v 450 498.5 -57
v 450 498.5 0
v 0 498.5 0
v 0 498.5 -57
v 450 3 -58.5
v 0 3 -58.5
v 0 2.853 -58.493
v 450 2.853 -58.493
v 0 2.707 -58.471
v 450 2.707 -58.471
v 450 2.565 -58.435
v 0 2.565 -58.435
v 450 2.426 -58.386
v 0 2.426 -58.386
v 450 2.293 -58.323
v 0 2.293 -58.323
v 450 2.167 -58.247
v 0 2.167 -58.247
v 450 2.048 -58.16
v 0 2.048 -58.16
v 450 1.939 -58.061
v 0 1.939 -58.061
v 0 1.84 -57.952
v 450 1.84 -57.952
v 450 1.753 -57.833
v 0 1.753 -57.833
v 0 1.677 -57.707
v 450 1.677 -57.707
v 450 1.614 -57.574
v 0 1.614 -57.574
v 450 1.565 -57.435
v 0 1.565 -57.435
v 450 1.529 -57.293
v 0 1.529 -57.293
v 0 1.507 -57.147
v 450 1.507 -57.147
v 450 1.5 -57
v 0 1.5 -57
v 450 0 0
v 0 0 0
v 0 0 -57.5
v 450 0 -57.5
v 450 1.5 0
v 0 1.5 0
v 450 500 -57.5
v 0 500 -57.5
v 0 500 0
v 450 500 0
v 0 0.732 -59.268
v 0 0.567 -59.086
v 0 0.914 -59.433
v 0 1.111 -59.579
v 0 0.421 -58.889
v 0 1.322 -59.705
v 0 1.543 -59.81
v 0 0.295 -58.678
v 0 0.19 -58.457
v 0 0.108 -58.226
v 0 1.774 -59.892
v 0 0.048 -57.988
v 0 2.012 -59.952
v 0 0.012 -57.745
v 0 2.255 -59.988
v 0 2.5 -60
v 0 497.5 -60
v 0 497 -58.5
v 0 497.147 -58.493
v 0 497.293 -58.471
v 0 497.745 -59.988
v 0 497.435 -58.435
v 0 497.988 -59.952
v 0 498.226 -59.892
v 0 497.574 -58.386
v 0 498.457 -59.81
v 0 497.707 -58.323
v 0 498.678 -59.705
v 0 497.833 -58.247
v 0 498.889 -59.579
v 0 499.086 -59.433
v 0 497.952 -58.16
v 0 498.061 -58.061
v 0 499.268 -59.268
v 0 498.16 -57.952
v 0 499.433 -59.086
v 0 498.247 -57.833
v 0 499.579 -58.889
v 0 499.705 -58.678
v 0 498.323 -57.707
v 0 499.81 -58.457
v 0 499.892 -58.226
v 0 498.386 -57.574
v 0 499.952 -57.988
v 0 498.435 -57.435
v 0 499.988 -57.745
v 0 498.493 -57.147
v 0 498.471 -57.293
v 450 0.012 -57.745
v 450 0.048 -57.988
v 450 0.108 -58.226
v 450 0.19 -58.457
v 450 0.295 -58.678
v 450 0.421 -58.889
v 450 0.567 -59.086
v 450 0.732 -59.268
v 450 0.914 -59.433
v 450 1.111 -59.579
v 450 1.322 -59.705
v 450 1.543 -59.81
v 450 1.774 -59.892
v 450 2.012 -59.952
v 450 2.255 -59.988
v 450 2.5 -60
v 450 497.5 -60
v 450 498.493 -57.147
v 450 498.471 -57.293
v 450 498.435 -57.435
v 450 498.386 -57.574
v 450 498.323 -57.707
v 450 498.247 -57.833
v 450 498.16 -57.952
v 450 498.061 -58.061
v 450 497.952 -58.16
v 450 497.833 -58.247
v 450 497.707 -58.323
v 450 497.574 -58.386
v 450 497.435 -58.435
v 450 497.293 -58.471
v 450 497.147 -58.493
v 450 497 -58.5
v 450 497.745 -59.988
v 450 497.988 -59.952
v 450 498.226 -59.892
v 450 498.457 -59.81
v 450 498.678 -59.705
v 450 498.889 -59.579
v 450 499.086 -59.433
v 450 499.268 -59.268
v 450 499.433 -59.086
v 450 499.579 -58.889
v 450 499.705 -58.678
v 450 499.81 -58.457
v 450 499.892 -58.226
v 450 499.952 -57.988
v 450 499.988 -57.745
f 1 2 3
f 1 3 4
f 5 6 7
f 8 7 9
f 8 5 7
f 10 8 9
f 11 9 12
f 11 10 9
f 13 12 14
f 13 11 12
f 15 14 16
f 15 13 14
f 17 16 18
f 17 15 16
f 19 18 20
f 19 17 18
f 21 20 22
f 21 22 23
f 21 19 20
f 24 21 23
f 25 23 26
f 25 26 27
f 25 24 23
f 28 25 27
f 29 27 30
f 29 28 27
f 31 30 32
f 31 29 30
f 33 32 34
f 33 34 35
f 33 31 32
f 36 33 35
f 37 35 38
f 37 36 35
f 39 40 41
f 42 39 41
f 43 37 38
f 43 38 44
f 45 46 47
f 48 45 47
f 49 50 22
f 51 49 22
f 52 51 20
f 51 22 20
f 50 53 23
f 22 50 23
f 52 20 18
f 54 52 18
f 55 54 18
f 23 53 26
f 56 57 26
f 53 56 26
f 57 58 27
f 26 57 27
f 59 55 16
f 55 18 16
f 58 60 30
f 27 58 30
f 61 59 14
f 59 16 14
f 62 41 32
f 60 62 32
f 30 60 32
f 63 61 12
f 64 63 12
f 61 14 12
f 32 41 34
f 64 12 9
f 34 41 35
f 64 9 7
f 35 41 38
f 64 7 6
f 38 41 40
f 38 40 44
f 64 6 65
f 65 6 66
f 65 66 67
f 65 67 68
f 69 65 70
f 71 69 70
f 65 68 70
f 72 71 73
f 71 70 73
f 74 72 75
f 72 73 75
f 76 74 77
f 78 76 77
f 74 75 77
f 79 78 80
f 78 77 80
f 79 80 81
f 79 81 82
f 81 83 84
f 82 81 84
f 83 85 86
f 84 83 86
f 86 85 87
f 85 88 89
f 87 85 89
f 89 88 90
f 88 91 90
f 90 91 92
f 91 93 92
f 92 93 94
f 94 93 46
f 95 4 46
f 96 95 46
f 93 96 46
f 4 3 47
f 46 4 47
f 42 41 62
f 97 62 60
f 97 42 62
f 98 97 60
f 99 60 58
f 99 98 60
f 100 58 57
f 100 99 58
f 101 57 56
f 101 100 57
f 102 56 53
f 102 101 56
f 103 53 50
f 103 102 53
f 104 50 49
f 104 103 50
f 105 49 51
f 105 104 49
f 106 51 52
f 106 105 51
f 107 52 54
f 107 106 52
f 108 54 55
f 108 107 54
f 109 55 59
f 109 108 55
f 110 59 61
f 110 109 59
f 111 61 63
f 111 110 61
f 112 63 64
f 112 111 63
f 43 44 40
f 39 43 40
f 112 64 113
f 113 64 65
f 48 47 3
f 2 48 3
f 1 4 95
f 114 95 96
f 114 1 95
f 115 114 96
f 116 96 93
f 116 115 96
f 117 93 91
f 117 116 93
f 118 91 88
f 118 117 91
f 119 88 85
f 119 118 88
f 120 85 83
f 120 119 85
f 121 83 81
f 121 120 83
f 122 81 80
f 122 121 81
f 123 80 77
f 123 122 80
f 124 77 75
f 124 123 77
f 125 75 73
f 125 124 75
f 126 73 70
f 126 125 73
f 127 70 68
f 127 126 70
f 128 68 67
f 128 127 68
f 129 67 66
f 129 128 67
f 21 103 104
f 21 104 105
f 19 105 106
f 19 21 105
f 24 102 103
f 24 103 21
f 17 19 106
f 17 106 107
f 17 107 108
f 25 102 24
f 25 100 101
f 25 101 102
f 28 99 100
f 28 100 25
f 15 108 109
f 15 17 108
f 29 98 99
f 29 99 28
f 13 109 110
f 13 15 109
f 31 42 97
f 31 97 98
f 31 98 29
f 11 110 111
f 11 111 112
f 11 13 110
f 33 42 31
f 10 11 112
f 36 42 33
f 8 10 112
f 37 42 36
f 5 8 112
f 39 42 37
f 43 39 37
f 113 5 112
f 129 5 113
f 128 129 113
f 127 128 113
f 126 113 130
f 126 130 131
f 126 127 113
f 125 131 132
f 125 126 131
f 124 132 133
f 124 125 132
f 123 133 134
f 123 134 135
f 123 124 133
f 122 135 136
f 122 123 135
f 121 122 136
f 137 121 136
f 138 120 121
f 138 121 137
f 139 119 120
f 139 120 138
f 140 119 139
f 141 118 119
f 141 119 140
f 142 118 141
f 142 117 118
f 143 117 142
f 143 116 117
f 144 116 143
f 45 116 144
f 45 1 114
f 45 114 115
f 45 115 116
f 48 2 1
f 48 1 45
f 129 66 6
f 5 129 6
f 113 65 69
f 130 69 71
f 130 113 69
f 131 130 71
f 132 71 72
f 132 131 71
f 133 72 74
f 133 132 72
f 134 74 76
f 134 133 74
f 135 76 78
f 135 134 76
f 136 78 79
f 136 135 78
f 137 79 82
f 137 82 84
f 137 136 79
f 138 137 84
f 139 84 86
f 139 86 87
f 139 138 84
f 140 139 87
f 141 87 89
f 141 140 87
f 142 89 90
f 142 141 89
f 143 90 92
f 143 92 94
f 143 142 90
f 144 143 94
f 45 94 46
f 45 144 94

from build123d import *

# Parameters (mm, degrees)
F6_DEPTH = 450
F1_R     = 2.5
F2_R     = 1.5
F3_R     = 1.5
F7_R     = 2.5


with BuildPart() as f6:
    # F0 (on Right) → F6 (new body)
    with BuildSketch(Plane.YZ):
        Polygon((1.5, 0), (0, 0), (0, -60), (500, -60), (500, 0), (498.5, 0), (498.5, -58.5), (1.5, -58.5), align=None)
    extrude(amount=F6_DEPTH)

    # F1
    f1_edges = [f6.edges().sort_by_distance(p)[0] for p in [
        (225, 500, -60),
    ]]
    fillet(f1_edges, radius=F1_R)

    # F2
    f2_edges = [f6.edges().sort_by_distance(p)[0] for p in [
        (225, 498.5, -58.5),
    ]]
    fillet(f2_edges, radius=F2_R)

    # F3
    f3_edges = [f6.edges().sort_by_distance(p)[0] for p in [
        (225, 1.5, -58.5),
    ]]
    fillet(f3_edges, radius=F3_R)

    # F7
    f7_edges = [f6.edges().sort_by_distance(p)[0] for p in [
        (225, 0, -60),
    ]]
    fillet(f7_edges, radius=F7_R)


solid = f6.part
